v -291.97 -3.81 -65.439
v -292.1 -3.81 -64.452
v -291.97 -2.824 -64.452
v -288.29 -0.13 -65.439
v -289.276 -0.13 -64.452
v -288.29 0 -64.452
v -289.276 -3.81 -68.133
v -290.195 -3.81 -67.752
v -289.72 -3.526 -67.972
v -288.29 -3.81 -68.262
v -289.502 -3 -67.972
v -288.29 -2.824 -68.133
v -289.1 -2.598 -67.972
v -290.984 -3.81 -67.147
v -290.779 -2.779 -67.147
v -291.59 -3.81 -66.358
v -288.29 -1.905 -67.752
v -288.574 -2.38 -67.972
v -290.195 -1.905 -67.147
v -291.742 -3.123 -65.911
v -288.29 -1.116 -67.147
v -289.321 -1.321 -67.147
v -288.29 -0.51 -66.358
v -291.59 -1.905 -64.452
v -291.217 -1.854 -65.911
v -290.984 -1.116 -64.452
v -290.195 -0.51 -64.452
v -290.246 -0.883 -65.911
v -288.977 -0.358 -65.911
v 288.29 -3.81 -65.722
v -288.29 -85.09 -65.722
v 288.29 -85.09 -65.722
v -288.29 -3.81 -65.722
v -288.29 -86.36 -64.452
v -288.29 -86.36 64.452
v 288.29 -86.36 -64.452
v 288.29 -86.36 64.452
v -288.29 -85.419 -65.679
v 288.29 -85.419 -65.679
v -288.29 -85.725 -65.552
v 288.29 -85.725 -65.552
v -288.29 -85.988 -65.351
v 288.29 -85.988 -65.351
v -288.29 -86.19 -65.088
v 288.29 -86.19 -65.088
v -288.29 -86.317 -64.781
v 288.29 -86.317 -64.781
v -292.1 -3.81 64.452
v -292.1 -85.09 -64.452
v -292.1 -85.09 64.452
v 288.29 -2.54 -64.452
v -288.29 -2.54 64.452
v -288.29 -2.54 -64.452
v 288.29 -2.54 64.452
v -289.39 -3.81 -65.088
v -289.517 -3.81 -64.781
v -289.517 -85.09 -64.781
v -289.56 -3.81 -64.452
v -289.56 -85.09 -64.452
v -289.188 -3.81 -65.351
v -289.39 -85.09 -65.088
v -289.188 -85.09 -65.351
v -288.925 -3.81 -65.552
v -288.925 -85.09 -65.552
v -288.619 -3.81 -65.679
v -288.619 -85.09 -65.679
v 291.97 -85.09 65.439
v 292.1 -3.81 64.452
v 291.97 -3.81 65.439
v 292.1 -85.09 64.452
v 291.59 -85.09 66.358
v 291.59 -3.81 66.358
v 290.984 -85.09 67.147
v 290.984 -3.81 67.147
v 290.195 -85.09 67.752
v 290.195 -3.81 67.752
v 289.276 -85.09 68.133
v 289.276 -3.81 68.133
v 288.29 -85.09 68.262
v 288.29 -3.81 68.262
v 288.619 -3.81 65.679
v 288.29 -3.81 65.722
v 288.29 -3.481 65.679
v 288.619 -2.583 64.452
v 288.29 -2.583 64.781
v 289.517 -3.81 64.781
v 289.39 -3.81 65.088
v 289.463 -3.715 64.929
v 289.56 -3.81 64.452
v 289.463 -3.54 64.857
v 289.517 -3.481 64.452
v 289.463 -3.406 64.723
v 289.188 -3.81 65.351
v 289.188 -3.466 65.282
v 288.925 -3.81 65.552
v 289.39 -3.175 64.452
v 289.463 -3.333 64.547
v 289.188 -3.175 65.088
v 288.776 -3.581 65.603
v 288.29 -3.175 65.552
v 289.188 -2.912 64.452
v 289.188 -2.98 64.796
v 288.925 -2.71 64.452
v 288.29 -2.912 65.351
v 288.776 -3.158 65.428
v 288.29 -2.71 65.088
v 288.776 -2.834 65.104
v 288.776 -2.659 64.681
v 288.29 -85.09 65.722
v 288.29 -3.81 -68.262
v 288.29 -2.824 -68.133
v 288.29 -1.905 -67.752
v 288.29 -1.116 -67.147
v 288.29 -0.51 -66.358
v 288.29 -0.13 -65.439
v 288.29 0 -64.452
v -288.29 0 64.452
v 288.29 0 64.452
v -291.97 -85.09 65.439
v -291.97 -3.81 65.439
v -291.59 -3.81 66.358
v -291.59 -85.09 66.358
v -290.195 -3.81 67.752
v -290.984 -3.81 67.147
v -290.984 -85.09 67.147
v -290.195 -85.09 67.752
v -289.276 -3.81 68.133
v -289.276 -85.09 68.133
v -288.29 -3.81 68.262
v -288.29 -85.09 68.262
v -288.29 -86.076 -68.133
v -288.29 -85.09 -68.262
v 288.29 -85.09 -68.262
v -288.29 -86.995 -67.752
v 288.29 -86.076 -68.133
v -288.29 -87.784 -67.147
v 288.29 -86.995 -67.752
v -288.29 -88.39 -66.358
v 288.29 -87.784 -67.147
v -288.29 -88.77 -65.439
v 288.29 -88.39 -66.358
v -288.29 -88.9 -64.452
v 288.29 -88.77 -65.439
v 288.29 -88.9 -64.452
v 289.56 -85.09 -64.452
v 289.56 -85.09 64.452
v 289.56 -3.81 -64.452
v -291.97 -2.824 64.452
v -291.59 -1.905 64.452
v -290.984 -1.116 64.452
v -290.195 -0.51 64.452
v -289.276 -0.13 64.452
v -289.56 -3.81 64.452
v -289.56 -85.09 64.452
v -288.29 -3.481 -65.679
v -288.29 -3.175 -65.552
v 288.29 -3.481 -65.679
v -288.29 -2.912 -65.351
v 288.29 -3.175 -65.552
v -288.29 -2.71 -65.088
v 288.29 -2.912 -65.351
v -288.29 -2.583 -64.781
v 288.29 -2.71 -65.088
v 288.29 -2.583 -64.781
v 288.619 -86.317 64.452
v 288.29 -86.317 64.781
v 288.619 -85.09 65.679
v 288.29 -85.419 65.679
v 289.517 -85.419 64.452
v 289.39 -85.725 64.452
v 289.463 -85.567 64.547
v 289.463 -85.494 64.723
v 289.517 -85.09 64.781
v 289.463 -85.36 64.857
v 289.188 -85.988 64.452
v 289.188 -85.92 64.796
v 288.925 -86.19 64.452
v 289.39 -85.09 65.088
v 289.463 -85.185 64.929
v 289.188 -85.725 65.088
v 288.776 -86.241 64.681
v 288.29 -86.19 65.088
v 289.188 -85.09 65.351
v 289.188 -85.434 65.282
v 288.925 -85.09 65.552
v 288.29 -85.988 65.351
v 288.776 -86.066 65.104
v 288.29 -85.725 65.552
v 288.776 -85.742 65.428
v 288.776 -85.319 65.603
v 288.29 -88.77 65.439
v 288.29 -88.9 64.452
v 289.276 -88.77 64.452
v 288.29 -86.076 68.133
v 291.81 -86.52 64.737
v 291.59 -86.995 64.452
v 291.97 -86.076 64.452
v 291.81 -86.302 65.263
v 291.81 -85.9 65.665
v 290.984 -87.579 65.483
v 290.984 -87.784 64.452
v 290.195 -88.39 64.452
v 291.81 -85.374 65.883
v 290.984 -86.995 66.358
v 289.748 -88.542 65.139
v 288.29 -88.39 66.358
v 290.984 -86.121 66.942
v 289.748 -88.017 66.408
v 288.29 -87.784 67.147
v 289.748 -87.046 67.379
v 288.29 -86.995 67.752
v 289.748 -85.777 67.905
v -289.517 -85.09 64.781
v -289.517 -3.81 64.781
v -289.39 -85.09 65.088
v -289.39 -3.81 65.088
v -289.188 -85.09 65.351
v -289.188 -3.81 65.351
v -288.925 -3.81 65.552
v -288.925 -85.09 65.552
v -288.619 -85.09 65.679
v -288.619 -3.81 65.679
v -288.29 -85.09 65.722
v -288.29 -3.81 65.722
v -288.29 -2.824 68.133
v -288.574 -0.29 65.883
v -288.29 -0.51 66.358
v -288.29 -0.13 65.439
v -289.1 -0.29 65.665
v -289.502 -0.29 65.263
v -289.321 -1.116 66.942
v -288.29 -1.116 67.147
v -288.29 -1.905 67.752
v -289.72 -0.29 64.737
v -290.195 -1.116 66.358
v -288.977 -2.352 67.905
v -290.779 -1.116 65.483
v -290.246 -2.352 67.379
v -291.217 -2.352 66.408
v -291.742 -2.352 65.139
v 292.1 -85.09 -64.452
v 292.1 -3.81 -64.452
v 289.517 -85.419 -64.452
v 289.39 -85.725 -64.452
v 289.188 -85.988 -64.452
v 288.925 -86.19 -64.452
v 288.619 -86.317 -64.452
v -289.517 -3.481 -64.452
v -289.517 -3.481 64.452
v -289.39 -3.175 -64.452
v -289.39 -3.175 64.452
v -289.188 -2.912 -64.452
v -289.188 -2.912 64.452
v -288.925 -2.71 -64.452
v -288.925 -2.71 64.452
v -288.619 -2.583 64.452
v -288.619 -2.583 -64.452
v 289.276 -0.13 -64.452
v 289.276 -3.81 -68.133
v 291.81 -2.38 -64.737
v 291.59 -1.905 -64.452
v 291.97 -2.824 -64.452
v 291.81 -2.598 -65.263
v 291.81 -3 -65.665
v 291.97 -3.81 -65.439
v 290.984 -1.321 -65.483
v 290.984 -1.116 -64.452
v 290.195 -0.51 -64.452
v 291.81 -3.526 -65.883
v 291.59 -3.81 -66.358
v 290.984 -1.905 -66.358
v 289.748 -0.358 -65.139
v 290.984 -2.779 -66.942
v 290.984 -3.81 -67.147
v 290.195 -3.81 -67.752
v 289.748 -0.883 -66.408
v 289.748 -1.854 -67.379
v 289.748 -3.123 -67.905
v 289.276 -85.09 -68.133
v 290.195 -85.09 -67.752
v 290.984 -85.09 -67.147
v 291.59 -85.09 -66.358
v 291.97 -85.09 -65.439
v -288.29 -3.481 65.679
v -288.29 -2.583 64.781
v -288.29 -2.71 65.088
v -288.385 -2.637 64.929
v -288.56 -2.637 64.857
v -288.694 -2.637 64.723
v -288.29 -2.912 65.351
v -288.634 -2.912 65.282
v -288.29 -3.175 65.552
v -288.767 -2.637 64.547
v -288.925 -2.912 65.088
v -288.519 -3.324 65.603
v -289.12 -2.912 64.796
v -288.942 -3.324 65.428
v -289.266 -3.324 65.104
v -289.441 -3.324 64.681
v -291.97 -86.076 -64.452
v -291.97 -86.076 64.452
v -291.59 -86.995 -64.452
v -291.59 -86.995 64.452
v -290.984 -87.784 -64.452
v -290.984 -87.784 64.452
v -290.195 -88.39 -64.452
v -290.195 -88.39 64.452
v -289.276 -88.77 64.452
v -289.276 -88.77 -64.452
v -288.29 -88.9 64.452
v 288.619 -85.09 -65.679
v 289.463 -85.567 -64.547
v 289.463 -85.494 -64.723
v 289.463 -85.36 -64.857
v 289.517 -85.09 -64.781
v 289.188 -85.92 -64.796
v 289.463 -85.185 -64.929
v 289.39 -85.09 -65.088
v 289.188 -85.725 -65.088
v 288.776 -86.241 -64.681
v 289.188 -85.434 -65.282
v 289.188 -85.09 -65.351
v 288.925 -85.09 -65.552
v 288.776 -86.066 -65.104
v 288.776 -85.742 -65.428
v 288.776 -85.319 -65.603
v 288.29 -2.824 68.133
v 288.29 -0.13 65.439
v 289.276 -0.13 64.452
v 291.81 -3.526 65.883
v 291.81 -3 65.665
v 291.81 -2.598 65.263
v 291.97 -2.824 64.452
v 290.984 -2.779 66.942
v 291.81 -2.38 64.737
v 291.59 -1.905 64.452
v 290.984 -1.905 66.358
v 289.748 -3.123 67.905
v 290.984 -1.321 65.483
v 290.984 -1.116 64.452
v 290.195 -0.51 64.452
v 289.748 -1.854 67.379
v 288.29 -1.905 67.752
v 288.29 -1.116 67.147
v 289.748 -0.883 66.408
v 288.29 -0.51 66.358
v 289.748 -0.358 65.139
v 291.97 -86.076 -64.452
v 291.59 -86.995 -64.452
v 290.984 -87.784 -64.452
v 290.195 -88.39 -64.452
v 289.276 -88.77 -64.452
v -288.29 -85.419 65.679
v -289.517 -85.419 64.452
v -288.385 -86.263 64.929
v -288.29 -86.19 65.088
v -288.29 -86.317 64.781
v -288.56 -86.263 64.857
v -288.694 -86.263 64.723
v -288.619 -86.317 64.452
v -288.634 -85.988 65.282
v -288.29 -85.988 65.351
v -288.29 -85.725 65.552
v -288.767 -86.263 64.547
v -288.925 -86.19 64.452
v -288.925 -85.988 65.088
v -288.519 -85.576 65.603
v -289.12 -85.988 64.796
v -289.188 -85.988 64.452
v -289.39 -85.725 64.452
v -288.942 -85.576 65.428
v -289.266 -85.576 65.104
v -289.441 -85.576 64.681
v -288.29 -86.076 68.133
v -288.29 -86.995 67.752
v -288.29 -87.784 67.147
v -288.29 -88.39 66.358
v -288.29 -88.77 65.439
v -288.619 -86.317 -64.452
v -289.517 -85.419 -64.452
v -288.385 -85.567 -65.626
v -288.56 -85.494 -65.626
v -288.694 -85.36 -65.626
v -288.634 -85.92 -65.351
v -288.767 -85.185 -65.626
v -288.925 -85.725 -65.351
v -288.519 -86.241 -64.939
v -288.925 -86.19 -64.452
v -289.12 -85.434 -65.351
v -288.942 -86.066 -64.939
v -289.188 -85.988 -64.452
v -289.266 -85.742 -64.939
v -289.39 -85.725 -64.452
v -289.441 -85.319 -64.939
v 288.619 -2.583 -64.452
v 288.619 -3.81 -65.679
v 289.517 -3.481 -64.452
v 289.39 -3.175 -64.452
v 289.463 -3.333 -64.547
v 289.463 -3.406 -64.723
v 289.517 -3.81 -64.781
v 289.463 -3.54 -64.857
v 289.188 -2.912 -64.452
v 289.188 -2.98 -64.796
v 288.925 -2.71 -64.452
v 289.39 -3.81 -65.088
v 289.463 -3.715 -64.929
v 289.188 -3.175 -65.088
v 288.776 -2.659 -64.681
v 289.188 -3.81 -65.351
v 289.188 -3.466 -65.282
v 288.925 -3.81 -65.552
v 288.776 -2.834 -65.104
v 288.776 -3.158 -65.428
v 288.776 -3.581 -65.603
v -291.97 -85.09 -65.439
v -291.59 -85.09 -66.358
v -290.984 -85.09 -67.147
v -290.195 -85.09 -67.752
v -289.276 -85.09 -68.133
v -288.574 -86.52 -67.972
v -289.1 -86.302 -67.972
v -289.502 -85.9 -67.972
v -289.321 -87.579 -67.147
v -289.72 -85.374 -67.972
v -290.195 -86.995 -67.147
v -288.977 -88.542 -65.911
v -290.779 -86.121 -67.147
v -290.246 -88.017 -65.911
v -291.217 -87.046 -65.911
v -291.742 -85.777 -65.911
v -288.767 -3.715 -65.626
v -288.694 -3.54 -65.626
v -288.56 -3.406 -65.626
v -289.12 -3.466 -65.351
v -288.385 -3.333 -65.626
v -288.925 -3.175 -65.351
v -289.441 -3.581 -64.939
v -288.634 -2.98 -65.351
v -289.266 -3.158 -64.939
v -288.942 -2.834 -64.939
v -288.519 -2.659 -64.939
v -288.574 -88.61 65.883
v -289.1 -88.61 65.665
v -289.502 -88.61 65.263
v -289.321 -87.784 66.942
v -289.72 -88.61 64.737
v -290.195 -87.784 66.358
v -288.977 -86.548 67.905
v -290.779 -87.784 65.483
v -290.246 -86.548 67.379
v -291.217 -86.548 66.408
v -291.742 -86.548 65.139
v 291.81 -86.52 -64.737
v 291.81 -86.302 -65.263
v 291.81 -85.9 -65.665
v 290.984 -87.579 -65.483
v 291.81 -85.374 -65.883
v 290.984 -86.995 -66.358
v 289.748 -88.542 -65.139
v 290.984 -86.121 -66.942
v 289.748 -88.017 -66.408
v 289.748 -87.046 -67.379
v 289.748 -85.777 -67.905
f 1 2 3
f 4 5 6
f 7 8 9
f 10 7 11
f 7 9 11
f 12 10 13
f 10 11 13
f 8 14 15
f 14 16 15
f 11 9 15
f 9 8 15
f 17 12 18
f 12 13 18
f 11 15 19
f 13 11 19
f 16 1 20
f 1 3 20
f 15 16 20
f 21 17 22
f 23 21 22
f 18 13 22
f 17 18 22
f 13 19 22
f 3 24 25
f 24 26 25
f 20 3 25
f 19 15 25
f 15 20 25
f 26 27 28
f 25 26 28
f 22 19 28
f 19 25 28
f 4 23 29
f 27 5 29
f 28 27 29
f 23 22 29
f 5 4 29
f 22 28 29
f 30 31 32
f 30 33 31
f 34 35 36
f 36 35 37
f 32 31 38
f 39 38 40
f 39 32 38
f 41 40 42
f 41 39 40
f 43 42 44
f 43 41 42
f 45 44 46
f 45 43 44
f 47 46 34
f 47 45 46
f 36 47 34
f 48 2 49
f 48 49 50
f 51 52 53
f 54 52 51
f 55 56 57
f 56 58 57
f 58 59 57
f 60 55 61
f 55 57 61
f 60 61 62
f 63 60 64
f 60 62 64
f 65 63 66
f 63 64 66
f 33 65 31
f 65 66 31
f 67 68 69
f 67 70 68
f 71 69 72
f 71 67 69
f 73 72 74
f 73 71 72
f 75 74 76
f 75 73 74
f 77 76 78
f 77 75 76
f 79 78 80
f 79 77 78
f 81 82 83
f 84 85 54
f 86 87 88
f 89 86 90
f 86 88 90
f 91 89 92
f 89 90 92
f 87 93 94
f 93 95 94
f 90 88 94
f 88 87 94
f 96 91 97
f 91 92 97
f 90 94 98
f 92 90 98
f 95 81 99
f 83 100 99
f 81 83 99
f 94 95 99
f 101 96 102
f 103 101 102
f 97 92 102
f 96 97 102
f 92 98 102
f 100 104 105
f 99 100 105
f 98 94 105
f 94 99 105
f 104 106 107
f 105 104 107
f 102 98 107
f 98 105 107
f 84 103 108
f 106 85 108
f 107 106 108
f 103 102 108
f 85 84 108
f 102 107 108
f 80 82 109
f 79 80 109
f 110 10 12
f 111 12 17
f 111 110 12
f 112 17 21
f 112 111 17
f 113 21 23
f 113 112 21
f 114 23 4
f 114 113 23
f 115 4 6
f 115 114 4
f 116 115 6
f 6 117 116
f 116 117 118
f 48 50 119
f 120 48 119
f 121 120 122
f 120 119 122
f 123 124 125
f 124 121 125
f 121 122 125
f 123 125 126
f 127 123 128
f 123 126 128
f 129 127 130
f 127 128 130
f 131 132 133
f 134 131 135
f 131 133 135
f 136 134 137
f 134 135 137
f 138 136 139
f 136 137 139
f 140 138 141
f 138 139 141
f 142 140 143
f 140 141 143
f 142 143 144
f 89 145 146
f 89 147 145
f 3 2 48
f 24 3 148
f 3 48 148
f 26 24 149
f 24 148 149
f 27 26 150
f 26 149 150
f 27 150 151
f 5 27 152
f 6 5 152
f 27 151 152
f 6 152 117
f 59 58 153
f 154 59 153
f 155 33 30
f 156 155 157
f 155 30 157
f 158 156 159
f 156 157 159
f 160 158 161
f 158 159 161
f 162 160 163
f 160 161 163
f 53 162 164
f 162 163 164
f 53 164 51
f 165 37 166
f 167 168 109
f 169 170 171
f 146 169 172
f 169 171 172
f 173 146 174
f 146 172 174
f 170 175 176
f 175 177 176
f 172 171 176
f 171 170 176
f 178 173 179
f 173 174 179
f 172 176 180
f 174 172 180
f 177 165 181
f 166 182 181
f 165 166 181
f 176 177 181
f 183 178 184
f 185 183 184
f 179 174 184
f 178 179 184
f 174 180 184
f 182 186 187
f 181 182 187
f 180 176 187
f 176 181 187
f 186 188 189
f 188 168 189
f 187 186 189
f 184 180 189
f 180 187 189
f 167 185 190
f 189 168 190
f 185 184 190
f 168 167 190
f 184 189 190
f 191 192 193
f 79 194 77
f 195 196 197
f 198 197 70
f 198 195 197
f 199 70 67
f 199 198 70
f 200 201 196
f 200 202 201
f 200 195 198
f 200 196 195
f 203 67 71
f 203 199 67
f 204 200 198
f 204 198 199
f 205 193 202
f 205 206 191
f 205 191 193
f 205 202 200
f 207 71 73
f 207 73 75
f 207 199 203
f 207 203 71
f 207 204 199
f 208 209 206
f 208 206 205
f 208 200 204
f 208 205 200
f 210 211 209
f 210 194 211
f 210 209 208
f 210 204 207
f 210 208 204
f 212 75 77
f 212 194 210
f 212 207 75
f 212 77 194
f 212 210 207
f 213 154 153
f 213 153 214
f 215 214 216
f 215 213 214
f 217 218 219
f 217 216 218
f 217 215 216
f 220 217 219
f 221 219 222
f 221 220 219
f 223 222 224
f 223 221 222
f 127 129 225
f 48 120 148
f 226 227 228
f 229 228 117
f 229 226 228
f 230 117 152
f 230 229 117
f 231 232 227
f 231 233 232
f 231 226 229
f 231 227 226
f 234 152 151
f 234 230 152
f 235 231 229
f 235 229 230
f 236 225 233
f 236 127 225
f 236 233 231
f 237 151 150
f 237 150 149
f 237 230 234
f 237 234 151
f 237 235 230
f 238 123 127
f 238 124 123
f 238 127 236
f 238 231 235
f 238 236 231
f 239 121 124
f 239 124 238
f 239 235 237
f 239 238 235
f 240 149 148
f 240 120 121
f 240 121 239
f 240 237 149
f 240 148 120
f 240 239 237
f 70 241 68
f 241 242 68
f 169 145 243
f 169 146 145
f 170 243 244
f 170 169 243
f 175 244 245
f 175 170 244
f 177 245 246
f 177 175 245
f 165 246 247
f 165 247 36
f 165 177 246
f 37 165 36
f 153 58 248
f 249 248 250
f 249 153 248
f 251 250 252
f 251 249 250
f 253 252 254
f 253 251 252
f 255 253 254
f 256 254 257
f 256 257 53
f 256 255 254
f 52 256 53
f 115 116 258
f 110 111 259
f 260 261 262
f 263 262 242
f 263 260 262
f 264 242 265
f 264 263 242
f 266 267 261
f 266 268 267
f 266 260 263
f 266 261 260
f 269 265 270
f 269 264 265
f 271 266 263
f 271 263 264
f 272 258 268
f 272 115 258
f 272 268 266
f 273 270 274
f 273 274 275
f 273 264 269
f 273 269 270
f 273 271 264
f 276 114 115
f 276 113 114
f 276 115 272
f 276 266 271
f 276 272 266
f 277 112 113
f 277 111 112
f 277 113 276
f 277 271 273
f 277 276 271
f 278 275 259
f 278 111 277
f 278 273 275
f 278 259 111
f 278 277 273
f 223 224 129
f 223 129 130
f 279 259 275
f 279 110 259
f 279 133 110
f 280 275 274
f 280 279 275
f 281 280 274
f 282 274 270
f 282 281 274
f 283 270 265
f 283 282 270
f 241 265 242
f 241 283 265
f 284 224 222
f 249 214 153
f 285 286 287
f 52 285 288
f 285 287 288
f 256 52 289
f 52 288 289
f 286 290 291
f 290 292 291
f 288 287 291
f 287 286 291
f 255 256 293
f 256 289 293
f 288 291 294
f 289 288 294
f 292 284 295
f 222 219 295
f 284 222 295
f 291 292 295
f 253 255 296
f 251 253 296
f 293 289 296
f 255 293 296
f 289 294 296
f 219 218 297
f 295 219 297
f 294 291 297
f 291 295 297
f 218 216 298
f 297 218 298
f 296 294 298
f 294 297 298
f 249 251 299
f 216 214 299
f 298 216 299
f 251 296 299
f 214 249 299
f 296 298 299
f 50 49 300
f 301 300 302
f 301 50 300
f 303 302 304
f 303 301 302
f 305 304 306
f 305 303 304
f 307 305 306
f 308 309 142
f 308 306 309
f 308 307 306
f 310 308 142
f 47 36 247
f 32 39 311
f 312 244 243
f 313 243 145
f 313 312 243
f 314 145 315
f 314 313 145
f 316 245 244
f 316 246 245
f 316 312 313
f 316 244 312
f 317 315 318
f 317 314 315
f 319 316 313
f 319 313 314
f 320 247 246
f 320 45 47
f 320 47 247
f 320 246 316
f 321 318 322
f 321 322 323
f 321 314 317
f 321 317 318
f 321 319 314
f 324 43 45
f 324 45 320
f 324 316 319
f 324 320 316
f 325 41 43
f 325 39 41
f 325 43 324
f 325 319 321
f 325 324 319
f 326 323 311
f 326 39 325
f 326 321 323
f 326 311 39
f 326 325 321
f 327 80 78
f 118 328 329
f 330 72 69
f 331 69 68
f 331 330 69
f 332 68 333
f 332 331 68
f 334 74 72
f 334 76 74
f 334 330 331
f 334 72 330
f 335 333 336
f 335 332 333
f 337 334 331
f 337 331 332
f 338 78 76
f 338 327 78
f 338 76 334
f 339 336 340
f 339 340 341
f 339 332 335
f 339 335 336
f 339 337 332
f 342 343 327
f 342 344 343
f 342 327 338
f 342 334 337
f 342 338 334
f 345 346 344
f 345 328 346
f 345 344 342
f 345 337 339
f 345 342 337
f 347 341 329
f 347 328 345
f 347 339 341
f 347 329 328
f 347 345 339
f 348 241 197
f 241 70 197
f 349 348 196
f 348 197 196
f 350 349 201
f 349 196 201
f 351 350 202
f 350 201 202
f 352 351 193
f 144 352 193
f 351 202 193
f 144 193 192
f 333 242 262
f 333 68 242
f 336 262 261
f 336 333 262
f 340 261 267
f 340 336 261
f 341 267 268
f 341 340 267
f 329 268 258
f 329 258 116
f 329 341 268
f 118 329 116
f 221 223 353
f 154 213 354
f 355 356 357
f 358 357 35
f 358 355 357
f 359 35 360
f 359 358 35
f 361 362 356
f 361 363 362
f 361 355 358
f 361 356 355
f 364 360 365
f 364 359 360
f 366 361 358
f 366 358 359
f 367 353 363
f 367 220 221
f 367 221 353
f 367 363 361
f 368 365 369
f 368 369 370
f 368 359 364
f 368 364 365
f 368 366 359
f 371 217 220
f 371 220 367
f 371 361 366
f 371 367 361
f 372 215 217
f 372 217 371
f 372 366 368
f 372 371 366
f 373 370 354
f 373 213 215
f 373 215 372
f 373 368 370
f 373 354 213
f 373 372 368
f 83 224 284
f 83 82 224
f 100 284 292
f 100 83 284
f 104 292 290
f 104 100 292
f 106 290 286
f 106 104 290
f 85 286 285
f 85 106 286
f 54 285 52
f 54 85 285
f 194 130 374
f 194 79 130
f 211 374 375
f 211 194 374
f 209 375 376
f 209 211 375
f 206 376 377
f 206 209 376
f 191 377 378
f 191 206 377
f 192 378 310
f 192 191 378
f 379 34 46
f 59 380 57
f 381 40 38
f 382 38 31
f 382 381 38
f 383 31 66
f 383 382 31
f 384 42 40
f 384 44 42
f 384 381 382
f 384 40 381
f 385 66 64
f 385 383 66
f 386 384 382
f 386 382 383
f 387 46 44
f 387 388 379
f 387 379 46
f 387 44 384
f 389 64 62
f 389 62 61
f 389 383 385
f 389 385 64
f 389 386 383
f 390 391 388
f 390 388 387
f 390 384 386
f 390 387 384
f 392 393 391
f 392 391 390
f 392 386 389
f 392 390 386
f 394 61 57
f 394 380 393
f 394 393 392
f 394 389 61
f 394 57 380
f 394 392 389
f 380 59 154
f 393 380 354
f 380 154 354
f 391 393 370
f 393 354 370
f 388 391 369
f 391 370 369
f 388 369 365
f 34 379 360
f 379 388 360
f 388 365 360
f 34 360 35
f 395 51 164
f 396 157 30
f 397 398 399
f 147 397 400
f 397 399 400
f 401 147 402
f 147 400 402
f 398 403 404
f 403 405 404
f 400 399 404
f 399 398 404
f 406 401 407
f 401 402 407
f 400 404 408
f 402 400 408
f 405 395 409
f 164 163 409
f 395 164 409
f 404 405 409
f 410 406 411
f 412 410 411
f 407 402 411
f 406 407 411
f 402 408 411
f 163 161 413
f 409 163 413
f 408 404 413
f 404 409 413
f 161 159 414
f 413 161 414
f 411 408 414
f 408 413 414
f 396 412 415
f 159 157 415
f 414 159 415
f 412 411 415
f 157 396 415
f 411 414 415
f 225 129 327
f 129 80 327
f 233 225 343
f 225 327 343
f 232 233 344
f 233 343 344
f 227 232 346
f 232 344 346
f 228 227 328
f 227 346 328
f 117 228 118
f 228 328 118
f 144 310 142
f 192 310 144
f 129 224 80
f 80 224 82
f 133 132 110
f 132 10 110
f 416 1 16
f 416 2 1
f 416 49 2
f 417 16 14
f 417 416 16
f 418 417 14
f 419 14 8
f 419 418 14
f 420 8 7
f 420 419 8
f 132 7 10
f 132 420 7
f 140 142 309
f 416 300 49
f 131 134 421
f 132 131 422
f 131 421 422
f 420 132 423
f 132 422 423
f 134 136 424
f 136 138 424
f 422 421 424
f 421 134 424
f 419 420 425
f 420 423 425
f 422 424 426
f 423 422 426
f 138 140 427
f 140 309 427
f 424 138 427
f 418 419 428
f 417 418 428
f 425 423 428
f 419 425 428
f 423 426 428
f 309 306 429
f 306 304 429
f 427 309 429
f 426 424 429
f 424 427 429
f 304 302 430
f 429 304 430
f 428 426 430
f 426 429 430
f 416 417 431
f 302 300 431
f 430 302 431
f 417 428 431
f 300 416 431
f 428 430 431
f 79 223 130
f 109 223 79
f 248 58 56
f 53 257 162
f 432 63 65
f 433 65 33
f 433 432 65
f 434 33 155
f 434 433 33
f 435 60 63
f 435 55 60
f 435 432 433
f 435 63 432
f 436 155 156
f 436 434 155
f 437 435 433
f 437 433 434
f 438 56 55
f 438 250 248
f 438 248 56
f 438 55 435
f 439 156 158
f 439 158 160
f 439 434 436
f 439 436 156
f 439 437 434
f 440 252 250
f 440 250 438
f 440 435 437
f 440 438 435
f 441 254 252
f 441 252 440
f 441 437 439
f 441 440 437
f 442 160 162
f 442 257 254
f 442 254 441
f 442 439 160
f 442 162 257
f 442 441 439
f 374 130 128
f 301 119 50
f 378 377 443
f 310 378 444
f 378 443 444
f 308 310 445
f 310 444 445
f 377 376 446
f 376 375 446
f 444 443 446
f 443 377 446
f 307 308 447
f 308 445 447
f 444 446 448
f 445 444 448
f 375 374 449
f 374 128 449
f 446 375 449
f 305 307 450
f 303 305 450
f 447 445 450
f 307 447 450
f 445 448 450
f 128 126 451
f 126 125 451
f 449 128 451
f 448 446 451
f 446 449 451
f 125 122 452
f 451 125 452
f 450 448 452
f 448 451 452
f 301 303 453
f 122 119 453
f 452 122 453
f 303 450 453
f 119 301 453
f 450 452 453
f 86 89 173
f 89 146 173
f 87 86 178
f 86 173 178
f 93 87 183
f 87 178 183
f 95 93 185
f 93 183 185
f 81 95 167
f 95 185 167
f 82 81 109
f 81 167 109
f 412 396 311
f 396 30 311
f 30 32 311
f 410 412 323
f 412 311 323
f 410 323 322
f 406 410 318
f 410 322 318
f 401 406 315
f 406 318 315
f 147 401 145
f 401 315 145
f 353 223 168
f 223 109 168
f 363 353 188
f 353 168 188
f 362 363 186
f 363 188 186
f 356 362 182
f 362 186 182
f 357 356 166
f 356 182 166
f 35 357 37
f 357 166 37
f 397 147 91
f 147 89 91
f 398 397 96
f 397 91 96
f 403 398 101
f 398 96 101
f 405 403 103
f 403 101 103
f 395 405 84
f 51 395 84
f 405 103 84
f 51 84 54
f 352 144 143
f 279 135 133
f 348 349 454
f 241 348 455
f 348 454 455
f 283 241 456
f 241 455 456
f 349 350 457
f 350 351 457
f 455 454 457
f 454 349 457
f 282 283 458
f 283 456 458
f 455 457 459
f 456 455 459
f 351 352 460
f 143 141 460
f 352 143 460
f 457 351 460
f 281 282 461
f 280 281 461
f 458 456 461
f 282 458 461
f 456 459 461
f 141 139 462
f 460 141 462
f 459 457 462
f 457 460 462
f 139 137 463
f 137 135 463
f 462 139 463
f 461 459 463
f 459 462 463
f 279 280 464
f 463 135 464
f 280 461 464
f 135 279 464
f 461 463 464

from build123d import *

# Parameters (mm, degrees)
F0_W     = 584.2
F0_H     = 136.525
F1_DEPTH = 88.9
F2_R     = 3.81
F3_T     = -2.54


# Not quite as in the source:
# - a shell that OpenCascade refuses in one call is made with other operations: the cavity is built on its own and cut out


with BuildPart() as f1:
    # F0 (on Front) → F1 (new body)
    with BuildSketch(Plane.XZ):
        Rectangle(F0_W, F0_H)
    extrude(amount=F1_DEPTH)

    # F2
    f2_edges = [f1.edges().sort_by_distance(p)[0] for p in [
        (-292.1, -44.45, 68.2625),
        (0, 0, 68.2625),
        (0, -88.9, 68.2625),
        (-292.1, -88.9, 0),
        (0, -88.9, -68.2625),
        (292.1, -88.9, 0),
        (292.1, -44.45, 68.2625),
        (-292.1, 0, 0),
        (-292.1, -44.45, -68.2625),
        (0, 0, -68.2625),
        (292.1, 0, 0),
        (292.1, -44.45, -68.2625),
    ]]
    fillet(f2_edges, radius=F2_R)

    # F3: a shell. OpenCascade refuses it in one call, so the cavity is built on its own and cut out:
    # the body offset inwards by the wall thickness, plus a prism from it out through each open face.
    f3_core = offset(f1.part, amount=F3_T, mode=Mode.PRIVATE)
    f3_exits = [f3_core.faces().sort_by_distance(p)[0] for p in [
        (0, -44.45, 65.7225),
    ]]
    add(f3_core, mode=Mode.SUBTRACT)
    extrude(f3_exits, amount=-F3_T, mode=Mode.SUBTRACT)


solid = f1.part
